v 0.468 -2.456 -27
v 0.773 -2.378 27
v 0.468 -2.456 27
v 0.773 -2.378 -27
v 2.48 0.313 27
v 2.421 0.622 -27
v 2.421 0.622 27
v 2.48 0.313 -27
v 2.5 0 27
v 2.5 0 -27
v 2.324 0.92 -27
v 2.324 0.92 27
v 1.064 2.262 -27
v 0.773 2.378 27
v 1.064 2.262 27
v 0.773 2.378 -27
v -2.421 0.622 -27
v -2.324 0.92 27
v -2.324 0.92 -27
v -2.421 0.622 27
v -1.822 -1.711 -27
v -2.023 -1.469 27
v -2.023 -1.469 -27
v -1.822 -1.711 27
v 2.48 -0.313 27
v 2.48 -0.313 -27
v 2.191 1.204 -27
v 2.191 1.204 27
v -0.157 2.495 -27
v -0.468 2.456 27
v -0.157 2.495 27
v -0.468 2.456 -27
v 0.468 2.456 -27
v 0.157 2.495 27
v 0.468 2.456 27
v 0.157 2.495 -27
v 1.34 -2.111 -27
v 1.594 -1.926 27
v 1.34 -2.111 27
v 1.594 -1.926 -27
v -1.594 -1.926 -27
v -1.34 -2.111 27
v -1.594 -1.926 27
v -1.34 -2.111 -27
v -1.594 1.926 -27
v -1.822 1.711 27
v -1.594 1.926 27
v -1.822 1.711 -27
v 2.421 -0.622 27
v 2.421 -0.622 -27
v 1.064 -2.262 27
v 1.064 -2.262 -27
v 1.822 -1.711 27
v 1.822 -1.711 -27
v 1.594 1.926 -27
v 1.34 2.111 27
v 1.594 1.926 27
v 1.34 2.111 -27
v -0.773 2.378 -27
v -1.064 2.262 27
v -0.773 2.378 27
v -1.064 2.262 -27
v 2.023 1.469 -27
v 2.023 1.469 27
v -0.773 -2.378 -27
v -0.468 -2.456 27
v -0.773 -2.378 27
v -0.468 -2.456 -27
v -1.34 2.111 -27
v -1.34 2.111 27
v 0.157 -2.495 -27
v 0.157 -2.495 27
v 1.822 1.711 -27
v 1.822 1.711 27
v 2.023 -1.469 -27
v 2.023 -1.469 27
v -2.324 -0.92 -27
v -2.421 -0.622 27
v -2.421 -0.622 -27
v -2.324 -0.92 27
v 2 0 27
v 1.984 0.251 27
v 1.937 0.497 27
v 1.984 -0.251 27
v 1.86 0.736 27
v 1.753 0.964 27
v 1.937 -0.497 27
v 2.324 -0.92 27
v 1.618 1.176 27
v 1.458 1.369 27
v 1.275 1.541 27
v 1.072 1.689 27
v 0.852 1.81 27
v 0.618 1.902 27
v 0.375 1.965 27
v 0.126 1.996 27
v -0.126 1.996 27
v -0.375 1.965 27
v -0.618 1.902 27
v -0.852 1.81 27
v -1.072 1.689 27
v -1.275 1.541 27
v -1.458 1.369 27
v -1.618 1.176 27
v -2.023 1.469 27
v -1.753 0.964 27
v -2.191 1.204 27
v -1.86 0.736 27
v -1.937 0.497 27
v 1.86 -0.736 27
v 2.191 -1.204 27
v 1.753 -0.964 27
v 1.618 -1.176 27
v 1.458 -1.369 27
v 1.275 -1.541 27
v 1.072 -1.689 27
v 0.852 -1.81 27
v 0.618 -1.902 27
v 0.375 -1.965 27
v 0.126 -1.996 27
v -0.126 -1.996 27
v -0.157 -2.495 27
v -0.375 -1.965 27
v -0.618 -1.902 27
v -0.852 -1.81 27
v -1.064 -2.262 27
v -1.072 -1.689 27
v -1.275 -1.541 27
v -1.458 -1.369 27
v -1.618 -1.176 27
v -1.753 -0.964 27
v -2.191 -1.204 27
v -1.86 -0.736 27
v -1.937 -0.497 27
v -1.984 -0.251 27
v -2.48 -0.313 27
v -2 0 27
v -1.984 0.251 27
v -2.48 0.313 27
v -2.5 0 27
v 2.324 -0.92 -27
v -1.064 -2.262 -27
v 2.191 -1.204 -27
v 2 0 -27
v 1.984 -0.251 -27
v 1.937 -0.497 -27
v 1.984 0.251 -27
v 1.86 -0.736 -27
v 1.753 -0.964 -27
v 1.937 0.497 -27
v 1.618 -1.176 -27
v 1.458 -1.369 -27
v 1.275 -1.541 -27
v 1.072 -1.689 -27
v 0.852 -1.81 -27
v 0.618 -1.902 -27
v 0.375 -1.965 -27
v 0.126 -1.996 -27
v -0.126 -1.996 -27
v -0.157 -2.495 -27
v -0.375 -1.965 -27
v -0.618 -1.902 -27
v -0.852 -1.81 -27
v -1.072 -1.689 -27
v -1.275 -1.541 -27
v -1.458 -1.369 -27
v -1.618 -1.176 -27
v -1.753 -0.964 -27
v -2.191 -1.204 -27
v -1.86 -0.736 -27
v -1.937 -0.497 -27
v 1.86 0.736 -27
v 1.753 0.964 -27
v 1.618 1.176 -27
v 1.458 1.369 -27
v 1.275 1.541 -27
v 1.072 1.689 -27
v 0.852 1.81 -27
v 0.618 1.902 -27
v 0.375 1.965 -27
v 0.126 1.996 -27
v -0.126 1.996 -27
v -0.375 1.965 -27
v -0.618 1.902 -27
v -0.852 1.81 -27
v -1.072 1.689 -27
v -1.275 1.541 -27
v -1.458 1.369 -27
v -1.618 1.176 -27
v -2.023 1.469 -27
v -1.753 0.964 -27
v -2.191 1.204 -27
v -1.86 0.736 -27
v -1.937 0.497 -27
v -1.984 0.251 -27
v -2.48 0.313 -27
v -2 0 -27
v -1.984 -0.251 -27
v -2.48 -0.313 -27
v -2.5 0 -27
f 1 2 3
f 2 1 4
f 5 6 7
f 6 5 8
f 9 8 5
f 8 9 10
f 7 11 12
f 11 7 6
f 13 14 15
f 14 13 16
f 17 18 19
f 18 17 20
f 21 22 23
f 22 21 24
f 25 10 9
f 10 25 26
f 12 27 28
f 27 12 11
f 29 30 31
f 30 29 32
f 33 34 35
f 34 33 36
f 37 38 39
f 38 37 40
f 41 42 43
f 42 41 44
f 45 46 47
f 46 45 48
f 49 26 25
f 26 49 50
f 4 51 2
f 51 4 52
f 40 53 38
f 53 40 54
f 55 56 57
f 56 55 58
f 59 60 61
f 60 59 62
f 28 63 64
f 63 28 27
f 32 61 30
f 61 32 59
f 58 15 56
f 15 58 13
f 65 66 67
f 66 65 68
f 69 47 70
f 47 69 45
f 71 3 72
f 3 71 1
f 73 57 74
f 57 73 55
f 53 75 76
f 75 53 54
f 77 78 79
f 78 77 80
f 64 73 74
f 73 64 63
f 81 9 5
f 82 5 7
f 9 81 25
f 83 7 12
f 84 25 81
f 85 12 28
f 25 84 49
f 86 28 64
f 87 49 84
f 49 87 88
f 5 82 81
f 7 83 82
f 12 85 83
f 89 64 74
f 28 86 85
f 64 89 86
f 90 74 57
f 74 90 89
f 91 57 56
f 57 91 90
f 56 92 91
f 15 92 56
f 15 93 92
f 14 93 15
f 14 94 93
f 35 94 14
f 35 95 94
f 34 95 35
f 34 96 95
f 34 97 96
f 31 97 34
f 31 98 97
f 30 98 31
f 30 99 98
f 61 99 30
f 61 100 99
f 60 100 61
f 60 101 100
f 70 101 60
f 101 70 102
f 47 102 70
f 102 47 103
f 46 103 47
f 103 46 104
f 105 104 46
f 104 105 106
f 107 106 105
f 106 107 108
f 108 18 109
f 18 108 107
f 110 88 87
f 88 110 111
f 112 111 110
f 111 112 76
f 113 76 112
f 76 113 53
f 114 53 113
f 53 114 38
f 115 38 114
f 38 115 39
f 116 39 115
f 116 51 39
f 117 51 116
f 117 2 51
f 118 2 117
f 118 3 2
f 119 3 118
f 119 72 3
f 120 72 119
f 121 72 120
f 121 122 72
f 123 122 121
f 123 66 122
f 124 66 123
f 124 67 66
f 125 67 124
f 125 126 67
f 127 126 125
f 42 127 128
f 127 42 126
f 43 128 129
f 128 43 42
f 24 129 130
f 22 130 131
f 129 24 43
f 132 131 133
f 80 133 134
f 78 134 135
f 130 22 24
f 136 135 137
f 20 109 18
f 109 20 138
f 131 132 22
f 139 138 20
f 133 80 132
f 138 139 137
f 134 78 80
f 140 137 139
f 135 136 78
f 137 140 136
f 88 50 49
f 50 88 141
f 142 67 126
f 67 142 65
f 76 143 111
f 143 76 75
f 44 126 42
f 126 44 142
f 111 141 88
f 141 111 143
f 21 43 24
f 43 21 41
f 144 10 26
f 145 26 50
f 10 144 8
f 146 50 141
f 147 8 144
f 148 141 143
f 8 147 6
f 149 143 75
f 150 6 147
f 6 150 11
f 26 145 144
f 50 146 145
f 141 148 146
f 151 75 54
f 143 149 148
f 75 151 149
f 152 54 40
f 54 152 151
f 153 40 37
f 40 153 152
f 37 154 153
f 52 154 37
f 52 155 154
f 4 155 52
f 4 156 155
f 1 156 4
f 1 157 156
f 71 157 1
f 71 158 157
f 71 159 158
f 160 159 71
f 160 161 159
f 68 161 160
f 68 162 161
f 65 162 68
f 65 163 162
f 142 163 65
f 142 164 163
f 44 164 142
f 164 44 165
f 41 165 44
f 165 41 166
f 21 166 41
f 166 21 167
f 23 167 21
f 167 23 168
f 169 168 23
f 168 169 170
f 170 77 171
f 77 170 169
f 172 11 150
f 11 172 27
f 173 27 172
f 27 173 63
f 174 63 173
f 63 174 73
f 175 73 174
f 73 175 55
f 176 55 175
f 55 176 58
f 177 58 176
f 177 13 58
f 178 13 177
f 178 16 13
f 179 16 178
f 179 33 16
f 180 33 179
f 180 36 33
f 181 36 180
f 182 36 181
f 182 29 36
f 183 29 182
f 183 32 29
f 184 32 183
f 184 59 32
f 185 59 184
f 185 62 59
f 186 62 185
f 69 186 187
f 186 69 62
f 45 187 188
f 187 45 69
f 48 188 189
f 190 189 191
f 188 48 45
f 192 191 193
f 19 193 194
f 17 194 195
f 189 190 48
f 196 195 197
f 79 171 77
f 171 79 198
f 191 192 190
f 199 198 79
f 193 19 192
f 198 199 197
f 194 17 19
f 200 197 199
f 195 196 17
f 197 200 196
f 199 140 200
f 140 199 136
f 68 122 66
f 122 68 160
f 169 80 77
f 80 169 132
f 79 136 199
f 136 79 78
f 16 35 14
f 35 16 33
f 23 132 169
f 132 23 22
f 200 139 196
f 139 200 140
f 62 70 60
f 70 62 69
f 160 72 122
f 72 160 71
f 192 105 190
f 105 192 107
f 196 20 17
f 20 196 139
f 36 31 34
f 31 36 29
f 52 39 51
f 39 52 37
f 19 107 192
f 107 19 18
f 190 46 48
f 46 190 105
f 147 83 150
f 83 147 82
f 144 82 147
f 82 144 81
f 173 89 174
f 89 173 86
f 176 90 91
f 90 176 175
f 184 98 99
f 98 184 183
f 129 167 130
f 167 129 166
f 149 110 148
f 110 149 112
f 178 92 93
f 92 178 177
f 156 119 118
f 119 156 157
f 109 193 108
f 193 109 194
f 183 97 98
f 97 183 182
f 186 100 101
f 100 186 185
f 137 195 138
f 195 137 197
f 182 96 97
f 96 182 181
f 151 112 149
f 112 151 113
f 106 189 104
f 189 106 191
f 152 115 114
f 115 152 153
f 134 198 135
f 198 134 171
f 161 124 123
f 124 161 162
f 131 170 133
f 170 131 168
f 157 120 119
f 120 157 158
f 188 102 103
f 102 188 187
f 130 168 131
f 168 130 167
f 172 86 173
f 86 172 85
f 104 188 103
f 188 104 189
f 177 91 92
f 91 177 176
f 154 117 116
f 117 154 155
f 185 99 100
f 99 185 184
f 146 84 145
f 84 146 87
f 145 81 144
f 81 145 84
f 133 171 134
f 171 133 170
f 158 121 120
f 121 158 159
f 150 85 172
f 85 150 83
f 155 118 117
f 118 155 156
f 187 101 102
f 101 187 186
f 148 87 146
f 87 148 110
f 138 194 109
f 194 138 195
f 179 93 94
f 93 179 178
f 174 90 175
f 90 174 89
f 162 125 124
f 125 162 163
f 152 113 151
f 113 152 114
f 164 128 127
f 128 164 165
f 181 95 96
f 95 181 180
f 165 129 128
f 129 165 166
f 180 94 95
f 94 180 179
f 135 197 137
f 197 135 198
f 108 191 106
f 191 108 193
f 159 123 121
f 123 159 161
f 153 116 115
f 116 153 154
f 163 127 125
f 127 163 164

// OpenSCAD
$fn = 50;


difference() {
	union() {
		translate(v = [0, 0, -27.0000000000]) {
			cylinder(h = 54, r = 2.5000000000);
		}
	}
	union() {
		translate(v = [0, 0, -100.0000000000]) {
			cylinder(h = 200, r = 2.0000000000);
		}
	}
}
